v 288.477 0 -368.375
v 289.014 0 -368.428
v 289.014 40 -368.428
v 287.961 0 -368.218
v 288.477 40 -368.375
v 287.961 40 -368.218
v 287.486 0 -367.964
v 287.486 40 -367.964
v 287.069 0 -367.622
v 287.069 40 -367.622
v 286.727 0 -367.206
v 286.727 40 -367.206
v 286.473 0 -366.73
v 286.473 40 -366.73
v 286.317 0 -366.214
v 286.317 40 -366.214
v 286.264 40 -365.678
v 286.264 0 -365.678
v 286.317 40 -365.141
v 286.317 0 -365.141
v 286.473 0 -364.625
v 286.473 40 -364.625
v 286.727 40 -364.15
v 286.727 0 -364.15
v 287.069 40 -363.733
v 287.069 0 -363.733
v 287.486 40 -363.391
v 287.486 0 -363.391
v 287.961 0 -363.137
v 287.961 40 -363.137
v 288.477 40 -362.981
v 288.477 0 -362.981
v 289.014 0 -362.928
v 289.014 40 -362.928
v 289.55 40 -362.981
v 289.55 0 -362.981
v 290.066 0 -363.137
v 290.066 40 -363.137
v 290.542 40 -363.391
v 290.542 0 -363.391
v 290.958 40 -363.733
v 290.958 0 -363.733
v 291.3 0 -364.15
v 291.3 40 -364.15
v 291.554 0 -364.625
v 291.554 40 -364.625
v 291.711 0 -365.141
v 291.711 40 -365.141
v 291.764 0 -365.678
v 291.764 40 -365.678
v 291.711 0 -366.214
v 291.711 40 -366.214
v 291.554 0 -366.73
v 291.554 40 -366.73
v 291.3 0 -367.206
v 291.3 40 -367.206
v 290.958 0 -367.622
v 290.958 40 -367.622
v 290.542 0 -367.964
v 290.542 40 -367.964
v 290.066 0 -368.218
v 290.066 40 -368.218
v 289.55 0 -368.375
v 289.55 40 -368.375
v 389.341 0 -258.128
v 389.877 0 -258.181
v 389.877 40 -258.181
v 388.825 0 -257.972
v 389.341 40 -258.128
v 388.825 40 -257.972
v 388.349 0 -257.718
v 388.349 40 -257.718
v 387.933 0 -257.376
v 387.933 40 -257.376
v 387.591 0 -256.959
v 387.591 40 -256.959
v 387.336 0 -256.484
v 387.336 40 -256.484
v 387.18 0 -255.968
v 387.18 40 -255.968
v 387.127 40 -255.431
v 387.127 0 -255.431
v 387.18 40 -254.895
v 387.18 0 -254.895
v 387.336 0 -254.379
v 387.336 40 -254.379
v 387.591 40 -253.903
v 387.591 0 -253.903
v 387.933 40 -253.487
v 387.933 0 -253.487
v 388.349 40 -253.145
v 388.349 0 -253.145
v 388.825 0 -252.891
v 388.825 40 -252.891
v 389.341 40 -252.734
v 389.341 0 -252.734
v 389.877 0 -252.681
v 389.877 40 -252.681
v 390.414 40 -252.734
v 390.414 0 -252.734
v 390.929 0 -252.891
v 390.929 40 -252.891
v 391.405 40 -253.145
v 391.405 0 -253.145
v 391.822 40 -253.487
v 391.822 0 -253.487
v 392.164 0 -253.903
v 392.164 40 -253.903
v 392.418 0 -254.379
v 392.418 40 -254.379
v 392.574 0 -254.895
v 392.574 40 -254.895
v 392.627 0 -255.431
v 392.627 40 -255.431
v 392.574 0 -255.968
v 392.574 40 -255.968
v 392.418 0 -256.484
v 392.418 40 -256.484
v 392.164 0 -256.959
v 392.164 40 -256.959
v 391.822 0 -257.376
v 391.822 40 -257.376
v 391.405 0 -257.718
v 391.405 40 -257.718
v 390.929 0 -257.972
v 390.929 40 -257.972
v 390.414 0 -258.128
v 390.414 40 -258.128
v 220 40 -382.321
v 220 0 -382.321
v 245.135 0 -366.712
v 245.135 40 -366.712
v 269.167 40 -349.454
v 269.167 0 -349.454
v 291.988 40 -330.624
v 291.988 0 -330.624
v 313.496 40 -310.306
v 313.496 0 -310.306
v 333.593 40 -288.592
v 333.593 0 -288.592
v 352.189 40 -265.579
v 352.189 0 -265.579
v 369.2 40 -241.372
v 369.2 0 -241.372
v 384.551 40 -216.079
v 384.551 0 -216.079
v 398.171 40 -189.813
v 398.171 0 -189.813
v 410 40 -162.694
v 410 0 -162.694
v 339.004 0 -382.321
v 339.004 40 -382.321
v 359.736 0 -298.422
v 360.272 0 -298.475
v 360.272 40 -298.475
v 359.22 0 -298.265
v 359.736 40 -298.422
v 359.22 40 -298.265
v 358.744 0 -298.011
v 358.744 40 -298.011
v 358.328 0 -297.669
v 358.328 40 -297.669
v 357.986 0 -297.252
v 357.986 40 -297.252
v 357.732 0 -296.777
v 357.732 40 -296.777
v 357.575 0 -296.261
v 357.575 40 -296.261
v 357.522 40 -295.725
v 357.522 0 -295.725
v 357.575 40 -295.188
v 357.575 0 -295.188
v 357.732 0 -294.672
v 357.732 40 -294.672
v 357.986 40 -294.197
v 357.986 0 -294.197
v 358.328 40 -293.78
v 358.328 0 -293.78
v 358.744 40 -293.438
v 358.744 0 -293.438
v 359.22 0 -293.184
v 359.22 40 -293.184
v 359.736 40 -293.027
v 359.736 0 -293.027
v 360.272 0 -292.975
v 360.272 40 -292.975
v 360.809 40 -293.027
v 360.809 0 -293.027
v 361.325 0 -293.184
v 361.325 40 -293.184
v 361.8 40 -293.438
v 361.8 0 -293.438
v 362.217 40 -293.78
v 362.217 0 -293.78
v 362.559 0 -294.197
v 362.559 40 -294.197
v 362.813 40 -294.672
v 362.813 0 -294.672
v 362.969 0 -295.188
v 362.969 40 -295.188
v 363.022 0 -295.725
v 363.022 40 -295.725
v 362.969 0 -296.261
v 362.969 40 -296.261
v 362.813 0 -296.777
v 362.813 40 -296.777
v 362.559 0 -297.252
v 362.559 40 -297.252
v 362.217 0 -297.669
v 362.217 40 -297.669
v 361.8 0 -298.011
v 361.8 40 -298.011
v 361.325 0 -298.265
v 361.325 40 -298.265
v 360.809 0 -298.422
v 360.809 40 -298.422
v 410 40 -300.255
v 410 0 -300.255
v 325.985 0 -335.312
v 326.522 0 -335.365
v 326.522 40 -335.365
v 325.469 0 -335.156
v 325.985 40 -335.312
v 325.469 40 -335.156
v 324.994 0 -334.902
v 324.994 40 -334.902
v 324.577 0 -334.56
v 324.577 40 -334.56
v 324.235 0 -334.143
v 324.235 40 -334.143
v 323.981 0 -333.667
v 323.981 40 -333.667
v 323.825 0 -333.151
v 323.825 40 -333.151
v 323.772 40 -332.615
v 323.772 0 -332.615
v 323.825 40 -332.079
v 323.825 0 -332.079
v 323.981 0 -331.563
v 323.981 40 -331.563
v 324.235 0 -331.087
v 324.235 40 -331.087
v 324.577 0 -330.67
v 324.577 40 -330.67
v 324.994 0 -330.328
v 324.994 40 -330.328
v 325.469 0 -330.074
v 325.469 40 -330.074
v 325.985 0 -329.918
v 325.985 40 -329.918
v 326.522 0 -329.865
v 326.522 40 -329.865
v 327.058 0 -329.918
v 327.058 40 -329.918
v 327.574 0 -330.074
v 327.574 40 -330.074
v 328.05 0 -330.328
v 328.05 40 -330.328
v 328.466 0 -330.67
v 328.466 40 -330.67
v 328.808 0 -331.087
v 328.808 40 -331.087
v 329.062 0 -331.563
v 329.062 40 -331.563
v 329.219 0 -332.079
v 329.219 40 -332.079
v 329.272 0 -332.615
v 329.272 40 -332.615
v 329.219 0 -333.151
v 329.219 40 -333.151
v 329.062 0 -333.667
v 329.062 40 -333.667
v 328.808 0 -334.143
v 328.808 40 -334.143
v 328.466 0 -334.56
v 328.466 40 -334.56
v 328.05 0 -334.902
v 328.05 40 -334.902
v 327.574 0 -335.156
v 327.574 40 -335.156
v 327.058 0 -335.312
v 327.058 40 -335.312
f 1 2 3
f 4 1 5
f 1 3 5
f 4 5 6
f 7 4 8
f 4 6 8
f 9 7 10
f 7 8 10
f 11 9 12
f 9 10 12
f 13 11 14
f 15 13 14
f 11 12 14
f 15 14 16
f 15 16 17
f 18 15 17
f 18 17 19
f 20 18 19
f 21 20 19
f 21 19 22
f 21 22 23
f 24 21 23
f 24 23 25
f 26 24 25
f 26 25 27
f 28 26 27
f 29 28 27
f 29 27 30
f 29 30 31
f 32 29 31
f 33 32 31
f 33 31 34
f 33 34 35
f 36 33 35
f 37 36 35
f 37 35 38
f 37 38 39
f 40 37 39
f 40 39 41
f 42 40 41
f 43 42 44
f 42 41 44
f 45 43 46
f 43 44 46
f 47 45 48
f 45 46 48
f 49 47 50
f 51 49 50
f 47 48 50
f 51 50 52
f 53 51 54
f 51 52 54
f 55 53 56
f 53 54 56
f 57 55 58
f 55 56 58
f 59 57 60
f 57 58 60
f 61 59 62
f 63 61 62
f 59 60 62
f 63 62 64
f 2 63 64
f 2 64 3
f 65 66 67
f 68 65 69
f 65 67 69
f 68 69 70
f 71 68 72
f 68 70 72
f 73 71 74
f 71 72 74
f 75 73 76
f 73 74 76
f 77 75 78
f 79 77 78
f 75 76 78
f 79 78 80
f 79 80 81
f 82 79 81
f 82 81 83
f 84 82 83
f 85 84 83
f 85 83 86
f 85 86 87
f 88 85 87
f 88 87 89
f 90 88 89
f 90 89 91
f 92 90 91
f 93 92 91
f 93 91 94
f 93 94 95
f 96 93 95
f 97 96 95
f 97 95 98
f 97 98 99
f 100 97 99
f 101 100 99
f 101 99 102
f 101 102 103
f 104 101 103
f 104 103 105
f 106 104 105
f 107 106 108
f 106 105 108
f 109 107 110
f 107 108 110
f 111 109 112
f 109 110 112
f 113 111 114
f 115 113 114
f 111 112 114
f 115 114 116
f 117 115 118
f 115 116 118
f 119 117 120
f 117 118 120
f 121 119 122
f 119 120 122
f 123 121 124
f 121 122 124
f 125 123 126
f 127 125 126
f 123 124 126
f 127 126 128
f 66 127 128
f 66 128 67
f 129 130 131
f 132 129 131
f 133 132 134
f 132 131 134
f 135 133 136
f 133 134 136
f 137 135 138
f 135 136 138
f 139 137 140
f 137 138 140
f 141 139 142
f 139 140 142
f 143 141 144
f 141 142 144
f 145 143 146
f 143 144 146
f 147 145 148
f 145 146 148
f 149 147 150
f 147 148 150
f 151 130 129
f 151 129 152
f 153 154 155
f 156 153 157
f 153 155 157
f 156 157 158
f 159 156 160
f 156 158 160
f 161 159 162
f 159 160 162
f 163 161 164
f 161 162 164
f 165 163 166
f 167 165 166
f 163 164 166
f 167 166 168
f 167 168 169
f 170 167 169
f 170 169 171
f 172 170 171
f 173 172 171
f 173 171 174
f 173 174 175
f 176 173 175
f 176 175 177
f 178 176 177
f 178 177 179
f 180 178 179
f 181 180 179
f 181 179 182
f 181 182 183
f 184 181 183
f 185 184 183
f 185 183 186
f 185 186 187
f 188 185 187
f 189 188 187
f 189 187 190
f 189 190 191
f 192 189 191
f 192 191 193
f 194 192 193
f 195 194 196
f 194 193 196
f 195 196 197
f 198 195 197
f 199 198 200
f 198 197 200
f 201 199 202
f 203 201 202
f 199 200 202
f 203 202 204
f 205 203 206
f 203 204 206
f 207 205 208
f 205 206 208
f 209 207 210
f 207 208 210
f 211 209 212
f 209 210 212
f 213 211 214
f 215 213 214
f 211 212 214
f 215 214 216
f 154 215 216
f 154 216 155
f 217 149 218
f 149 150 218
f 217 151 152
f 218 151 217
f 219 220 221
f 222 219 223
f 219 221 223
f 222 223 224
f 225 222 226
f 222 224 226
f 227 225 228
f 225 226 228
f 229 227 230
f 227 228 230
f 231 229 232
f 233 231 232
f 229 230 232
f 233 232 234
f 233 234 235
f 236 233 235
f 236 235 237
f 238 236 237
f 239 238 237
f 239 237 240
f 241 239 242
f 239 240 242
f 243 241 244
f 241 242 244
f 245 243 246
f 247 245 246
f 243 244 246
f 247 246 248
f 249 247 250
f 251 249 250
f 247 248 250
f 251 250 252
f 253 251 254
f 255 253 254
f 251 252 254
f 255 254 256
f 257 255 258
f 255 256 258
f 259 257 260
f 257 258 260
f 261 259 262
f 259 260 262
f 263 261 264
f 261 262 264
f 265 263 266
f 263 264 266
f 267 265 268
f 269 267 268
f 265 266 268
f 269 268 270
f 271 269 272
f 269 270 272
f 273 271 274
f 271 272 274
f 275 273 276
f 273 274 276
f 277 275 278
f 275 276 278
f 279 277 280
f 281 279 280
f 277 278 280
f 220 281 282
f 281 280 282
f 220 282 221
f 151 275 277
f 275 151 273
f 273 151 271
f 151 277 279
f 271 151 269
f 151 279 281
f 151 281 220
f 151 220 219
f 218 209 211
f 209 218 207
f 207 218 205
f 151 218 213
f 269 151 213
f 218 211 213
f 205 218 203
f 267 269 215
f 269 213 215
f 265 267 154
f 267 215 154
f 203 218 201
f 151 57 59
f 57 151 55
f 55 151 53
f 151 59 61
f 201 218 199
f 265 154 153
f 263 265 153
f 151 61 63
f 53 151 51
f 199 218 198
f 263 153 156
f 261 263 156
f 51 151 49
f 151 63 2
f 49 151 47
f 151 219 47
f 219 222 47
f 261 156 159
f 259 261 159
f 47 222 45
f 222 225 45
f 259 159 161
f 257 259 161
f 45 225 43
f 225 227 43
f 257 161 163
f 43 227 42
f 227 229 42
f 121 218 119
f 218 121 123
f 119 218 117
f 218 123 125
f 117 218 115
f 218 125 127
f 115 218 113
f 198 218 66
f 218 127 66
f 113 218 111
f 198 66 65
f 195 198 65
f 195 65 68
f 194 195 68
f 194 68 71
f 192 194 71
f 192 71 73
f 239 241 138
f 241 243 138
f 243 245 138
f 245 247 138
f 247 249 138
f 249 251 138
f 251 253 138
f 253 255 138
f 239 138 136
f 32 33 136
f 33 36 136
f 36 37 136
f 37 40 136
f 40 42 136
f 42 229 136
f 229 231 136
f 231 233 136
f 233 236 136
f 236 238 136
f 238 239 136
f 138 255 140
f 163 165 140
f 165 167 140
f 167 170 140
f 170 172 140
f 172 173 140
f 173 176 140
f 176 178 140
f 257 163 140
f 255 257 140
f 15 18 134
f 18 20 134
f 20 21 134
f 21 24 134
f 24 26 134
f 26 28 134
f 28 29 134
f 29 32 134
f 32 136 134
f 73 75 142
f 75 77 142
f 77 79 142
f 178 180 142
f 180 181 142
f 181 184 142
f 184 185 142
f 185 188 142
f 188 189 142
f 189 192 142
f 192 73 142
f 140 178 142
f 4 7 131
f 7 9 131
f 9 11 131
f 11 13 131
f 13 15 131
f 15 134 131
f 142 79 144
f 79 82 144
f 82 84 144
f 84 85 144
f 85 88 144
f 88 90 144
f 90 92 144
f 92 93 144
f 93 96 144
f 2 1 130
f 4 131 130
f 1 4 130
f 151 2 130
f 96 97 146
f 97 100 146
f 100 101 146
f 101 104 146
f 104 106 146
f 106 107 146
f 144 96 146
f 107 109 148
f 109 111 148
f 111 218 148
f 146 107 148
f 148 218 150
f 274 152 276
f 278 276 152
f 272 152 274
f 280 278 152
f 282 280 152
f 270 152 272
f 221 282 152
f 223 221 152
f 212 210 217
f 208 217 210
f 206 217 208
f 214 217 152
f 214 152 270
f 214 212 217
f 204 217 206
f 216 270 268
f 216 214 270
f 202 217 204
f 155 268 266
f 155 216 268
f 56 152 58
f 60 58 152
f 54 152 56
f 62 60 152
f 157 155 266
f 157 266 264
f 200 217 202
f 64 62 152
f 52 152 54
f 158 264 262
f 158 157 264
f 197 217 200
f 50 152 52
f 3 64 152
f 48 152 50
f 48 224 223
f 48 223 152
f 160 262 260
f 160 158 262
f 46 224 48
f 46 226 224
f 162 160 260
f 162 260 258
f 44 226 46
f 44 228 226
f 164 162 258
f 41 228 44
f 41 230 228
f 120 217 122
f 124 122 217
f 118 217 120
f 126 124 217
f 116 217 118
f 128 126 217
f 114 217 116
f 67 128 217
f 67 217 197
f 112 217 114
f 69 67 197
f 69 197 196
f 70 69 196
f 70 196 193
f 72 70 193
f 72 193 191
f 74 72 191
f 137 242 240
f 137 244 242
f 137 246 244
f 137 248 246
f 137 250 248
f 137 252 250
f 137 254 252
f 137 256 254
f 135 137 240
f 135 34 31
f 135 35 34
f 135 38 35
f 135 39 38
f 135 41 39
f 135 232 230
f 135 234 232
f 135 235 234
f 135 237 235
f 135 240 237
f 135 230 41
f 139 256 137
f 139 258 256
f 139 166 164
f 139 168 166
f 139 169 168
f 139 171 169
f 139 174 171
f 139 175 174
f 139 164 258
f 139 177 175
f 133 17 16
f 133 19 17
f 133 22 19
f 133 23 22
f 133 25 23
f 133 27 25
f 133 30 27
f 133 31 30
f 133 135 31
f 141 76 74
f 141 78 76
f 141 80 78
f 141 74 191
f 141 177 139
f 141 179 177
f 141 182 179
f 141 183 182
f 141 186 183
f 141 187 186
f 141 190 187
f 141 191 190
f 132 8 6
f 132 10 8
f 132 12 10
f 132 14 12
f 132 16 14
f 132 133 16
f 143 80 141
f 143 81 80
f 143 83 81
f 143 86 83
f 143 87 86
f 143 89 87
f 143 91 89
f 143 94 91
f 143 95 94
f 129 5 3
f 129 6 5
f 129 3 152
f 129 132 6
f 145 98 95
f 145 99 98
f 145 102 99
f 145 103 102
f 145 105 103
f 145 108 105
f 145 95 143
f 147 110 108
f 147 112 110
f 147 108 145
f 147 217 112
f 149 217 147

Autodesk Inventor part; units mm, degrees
ref_plane "YZ Plane" through (0, 0, 0) normal (1, 0, 0) x (0, 1, 0)
ref_plane "XZ Plane" through (0, 0, 0) normal (0, 1, 0) x (-1, 0, 0)
ref_plane "XY Plane" through (0, 0, 0) normal (0, 0, 1) x (1, 0, 0)
sketch "Sketch1" plane through (0, 0, 0) normal (0, 1, 0) x (-1, 0, 0)
  line L0 (0, 329.241) -> (0, -329.241) construction
  line L1 (203.5937, 0) -> (-203.5937, 0) construction
  arc A0 (-441.1, 0) -> (220, -382.3208) centre (0, 0) ccw
  line L2 (-441.1, 0) -> (-441.1, 400)
  line L3 (-441.1, 400) -> (-500, 400)
  line L4 (-500, 400) -> (-500, -500)
  line L5 (-500, -500) -> (220, -500)
  line L6 (220, -500) -> (220, -382.3208)
  dimension "d0" = 500
  dimension "d1" = 400
  dimension "d2" = 500
  dimension "d3" = 441.1
  dimension "d4" = 720
extrude "Extrusion1" add sketch "Sketch1" along normal blind 40
sketch "Sketch3" plane through (0, 0, 0) normal (0, -1, 0) x (1, 0, 0)
  line L0 (339.0044, -382.3208) -> (410, -300.2547)
  line L1 (410, -162.6936) -> (220, -382.3208)
  arc A0 (-220, -382.3208) -> (441.1, 0) centre (0, 0) ccw projected
  line L2 (500, 400) -> (500, -500) projected
  line L3 (-595.7823, 565.809) -> (852.8514, 565.809)
  line L4 (852.8514, 565.809) -> (852.8514, -851.0184)
  line L5 (852.8514, -851.0184) -> (-595.7823, -851.0184)
  line L6 (-595.7823, -851.0184) -> (-595.7823, 565.809)
  line L7 (220, -382.3208) -> (339.0044, -382.3208)
  line L8 (410, -162.6936) -> (410, -300.2547)
  dimension "d71" = 90
  dimension "d75" = 90
  dimension "d76" = 290.4068
sketch "Sketch4" plane through (0, 0, 0) normal (0, -1, 0) x (1, 0, 0)
  line L0 (441.1, 400) -> (500, 400) construction
  line L1 (441.1, 0) -> (441.1, 400) construction
  arc A0 (-220, -382.3208) -> (441.1, 0) centre (0, 0) ccw construction
  line L2 (464.3817, -39.9852) -> (0, 0) construction
  line L3 (0, 0) -> (445.1648, -138.1214) construction
  line L4 (423.7332, -194.1633) -> (0, 0) construction
  line L5 (360.2723, -295.7246) -> (0, 0) construction
  line L6 (289.0138, -365.6778) -> (0, 0) construction
  line L7 (389.8771, -255.4312) -> (0, 0) construction
  line L8 (326.5218, -332.615) -> (0, 0) construction
  line L9 (230.9911, -404.8361) -> (0, 0) construction
  line L10 (139.32, -444.7911) -> (0, 0) construction
  line L11 (41.2359, -464.2723) -> (0, 0) construction
  line L12 (464.3817, -39.9852) -> (445.1648, -138.1214) construction
  line L13 (445.1648, -138.1214) -> (423.7332, -194.1633) construction
  line L14 (423.7332, -194.1633) -> (389.8771, -255.4312) construction
  line L15 (389.8771, -255.4312) -> (360.2723, -295.7246) construction
  line L16 (360.2723, -295.7246) -> (326.5218, -332.615) construction
  line L17 (326.5218, -332.615) -> (289.0138, -365.6778) construction
  line L18 (289.0138, -365.6778) -> (230.9911, -404.8361) construction
  line L19 (230.9911, -404.8361) -> (139.32, -444.7911) construction
  line L20 (139.32, -444.7911) -> (41.2359, -464.2723) construction
  line L21 (-58.7462, -462.3831) -> (0, 0) construction
  line L22 (-156.0243, -439.2102) -> (0, 0) construction
  line L23 (-200, -421.0098) -> (0, 0) construction
  line L24 (41.2359, -464.2723) -> (-58.7462, -462.3831) construction
  line L25 (-58.7462, -462.3831) -> (-156.0243, -439.2102) construction
  line L26 (-200, -421.0098) -> (-156.0243, -439.2102) construction
  line L27 (-220, -500) -> (-220, -382.3208) construction
  point P0 (466.1, 360)
  point P1 (466.1, 260)
  point P2 (466.1, 160)
  point P3 (466.1, 60)
  dimension "d50" = 40
  dimension "d51" = 100
  dimension "d52" = 100
  dimension "d53" = 100
  dimension "d54" = 25
  dimension "d55" = 466.1
  dimension "d56" = 100
  dimension "d57" = 100
  dimension "d58" = 60
  dimension "d59" = 70
  dimension "d60" = 50
  dimension "d61" = 70
  dimension "d62" = 100
  dimension "d63" = 20
hole "Hole1" at (-200, 0, -421.0098) at (-156.0243, 0, -439.2102) at (-58.7462, 0, -462.3831) at (41.2359, 0, -464.2723) at (139.32, 0, -444.7911) at (230.9911, 0, -404.8361) at (289.0138, 0, -365.6778) at (326.5218, 0, -332.615) at (360.2723, 0, -295.7246) at (389.8771, 0, -255.4312) at (423.7332, 0, -194.1633) at (445.1648, 0, -138.1214) at (464.3817, 0, -39.9852) at (466.1, 0, 60) at (466.1, 0, 160) at (466.1, 0, 260) at (466.1, 0, 360) direction (0, 1, 0) diameter 5.5 end through all clearance for "Countersunk Flat Head Screw DIN EN ISO 2009" size "M5" standard "DIN"
extrude "Extrusion2" cut sketch "Sketch3" against normal through all
properties part number "boundaryV1"
